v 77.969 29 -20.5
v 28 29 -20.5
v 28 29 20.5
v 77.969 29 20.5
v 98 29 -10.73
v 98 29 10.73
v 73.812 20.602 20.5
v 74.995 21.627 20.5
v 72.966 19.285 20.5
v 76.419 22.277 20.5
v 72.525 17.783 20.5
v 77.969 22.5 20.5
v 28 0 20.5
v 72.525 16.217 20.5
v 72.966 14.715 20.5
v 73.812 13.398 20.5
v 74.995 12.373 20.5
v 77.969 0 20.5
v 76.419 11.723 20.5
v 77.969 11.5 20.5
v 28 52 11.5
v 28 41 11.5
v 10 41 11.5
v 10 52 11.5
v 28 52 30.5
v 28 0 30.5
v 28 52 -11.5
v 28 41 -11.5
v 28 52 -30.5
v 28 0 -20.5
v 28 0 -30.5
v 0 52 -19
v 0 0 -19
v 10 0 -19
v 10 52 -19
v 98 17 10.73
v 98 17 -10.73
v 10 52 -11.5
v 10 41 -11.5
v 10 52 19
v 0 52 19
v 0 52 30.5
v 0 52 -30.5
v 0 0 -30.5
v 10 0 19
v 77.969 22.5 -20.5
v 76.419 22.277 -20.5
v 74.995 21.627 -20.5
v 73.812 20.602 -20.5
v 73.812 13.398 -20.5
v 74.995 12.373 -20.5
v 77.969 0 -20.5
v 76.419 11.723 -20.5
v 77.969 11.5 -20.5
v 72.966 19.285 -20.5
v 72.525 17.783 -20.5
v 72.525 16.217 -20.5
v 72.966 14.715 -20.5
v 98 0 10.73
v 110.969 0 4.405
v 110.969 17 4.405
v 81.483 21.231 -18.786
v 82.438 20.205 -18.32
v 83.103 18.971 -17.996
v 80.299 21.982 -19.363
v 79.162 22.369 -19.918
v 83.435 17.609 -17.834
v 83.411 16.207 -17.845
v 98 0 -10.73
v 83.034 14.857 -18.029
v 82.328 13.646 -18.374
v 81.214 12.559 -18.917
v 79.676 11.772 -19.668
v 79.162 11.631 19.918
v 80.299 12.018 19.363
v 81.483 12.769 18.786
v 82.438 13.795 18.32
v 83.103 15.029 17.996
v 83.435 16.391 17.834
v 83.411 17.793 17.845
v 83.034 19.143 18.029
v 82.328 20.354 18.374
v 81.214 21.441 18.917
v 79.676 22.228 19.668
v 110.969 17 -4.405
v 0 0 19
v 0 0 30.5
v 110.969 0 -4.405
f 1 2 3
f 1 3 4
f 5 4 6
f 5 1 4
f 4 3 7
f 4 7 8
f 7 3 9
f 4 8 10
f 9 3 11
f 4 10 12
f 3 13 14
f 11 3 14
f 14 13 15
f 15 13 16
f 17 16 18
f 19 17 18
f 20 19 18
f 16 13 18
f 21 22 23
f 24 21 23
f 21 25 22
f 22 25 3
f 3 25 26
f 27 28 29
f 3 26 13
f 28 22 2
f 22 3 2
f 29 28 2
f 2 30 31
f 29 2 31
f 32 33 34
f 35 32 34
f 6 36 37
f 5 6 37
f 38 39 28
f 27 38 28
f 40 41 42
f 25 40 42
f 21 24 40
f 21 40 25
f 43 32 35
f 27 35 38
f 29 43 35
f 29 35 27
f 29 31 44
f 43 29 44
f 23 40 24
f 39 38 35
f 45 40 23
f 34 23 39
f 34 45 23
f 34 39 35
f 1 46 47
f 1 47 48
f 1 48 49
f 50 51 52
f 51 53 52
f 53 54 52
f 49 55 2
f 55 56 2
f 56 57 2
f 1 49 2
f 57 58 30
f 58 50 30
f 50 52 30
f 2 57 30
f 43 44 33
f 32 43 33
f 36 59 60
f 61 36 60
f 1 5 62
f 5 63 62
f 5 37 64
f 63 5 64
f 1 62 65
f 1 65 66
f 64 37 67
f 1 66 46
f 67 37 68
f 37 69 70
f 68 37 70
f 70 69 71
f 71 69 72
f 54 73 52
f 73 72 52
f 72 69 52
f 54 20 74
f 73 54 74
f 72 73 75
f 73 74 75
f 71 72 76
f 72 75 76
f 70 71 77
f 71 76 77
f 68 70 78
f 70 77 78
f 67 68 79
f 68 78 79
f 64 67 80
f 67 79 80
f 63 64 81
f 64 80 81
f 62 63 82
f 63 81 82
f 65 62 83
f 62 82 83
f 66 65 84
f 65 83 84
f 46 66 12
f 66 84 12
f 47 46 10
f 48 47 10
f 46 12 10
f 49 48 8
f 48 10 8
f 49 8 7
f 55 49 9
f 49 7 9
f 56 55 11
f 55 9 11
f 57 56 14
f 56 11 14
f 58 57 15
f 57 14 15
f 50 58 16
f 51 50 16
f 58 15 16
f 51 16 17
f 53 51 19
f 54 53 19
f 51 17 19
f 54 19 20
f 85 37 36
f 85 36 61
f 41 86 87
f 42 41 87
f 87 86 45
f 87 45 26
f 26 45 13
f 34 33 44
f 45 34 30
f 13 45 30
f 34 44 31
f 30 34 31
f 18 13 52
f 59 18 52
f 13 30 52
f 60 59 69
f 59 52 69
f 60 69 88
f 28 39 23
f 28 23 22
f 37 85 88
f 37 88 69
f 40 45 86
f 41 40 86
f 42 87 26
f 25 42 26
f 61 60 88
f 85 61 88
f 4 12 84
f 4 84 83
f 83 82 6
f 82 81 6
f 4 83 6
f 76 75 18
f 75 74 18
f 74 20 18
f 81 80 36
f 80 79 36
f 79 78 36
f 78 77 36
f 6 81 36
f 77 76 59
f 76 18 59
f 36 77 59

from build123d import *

# Parameters (mm, degrees)
BOSS_EXTRUDE1_DEPTH   = 52
BOSS_EXTRUDE1_2_DEPTH = 52
SKETCH1_3_W           = 18
SKETCH1_3_H           = 23
BOSS_EXTRUDE2_DEPTH   = 41
BOSS_EXTRUDE3_DEPTH   = 29
BOSS_EXTRUDE4_DEPTH   = 17
SKETCH2_R             = 5.5
CUT_EXTRUDE1_DEPTH    = 30.5


with BuildPart() as part:
    # Sketch1 → Boss-Extrude1 (new body)
    with BuildSketch(Plane(origin=(0, 0, 0), x_dir=(1, 0, 0), z_dir=(0, 1, 0))):
        Polygon((0, 19), (10, 19), (10, 11.5), (28, 11.5), (28, 30.5), (0, 30.5), align=None)
    extrude(amount=BOSS_EXTRUDE1_DEPTH)



with BuildPart() as body_2:
    # Sketch1 → Boss-Extrude1 2 (new body)
    with BuildSketch(Plane(origin=(0, 0, 0), x_dir=(1, 0, 0), z_dir=(0, 1, 0))):
        Polygon((28, -11.5), (10, -11.5), (10, -19), (0, -19), (0, -30.5), (28, -30.5), align=None)
    extrude(amount=BOSS_EXTRUDE1_2_DEPTH)


with BuildPart() as part_1:
    add(part.part)

    add(body_2.part)  # Boss-Extrude2 merges body 2
    # Sketch1<3> → Boss-Extrude2 (add)
    with BuildSketch(Plane(origin=(0, 0, 0), x_dir=(1, 0, 0), z_dir=(0, 1, 0))):
        with Locations((19, 0)):
            Rectangle(SKETCH1_3_W, SKETCH1_3_H)
    extrude(amount=BOSS_EXTRUDE2_DEPTH)

    # Sketch1<4> → Boss-Extrude3 (add)
    with BuildSketch(Plane(origin=(0, 0, 0), x_dir=(1, 0, 0), z_dir=(0, 1, 0))):
        Polygon((28, 20.5), (28, 11.5), (28, -11.5), (28, -20.5), (77.968771248, -20.5), (98, -10.730116948), (98, 10.730116948), (77.968771248, 20.5), align=None)
    extrude(amount=BOSS_EXTRUDE3_DEPTH)

    # Sketch1<5> → Boss-Extrude4 (add)
    with BuildSketch(Plane(origin=(0, 0, 0), x_dir=(1, 0, 0), z_dir=(0, 1, 0))):
        Polygon((110.968771248, 4.404824577), (98, 10.730116948), (98, -10.730116948), (110.968771248, -4.404824577), align=None)
    extrude(amount=BOSS_EXTRUDE4_DEPTH)

    # Sketch2 → Cut-Extrude1 (cut, symmetric)
    with BuildSketch(Plane.XY):
        with Locations((77.968771248, 17)):
            Circle(SKETCH2_R)
    extrude(amount=CUT_EXTRUDE1_DEPTH, both=True, mode=Mode.SUBTRACT)


solid = part_1.part
